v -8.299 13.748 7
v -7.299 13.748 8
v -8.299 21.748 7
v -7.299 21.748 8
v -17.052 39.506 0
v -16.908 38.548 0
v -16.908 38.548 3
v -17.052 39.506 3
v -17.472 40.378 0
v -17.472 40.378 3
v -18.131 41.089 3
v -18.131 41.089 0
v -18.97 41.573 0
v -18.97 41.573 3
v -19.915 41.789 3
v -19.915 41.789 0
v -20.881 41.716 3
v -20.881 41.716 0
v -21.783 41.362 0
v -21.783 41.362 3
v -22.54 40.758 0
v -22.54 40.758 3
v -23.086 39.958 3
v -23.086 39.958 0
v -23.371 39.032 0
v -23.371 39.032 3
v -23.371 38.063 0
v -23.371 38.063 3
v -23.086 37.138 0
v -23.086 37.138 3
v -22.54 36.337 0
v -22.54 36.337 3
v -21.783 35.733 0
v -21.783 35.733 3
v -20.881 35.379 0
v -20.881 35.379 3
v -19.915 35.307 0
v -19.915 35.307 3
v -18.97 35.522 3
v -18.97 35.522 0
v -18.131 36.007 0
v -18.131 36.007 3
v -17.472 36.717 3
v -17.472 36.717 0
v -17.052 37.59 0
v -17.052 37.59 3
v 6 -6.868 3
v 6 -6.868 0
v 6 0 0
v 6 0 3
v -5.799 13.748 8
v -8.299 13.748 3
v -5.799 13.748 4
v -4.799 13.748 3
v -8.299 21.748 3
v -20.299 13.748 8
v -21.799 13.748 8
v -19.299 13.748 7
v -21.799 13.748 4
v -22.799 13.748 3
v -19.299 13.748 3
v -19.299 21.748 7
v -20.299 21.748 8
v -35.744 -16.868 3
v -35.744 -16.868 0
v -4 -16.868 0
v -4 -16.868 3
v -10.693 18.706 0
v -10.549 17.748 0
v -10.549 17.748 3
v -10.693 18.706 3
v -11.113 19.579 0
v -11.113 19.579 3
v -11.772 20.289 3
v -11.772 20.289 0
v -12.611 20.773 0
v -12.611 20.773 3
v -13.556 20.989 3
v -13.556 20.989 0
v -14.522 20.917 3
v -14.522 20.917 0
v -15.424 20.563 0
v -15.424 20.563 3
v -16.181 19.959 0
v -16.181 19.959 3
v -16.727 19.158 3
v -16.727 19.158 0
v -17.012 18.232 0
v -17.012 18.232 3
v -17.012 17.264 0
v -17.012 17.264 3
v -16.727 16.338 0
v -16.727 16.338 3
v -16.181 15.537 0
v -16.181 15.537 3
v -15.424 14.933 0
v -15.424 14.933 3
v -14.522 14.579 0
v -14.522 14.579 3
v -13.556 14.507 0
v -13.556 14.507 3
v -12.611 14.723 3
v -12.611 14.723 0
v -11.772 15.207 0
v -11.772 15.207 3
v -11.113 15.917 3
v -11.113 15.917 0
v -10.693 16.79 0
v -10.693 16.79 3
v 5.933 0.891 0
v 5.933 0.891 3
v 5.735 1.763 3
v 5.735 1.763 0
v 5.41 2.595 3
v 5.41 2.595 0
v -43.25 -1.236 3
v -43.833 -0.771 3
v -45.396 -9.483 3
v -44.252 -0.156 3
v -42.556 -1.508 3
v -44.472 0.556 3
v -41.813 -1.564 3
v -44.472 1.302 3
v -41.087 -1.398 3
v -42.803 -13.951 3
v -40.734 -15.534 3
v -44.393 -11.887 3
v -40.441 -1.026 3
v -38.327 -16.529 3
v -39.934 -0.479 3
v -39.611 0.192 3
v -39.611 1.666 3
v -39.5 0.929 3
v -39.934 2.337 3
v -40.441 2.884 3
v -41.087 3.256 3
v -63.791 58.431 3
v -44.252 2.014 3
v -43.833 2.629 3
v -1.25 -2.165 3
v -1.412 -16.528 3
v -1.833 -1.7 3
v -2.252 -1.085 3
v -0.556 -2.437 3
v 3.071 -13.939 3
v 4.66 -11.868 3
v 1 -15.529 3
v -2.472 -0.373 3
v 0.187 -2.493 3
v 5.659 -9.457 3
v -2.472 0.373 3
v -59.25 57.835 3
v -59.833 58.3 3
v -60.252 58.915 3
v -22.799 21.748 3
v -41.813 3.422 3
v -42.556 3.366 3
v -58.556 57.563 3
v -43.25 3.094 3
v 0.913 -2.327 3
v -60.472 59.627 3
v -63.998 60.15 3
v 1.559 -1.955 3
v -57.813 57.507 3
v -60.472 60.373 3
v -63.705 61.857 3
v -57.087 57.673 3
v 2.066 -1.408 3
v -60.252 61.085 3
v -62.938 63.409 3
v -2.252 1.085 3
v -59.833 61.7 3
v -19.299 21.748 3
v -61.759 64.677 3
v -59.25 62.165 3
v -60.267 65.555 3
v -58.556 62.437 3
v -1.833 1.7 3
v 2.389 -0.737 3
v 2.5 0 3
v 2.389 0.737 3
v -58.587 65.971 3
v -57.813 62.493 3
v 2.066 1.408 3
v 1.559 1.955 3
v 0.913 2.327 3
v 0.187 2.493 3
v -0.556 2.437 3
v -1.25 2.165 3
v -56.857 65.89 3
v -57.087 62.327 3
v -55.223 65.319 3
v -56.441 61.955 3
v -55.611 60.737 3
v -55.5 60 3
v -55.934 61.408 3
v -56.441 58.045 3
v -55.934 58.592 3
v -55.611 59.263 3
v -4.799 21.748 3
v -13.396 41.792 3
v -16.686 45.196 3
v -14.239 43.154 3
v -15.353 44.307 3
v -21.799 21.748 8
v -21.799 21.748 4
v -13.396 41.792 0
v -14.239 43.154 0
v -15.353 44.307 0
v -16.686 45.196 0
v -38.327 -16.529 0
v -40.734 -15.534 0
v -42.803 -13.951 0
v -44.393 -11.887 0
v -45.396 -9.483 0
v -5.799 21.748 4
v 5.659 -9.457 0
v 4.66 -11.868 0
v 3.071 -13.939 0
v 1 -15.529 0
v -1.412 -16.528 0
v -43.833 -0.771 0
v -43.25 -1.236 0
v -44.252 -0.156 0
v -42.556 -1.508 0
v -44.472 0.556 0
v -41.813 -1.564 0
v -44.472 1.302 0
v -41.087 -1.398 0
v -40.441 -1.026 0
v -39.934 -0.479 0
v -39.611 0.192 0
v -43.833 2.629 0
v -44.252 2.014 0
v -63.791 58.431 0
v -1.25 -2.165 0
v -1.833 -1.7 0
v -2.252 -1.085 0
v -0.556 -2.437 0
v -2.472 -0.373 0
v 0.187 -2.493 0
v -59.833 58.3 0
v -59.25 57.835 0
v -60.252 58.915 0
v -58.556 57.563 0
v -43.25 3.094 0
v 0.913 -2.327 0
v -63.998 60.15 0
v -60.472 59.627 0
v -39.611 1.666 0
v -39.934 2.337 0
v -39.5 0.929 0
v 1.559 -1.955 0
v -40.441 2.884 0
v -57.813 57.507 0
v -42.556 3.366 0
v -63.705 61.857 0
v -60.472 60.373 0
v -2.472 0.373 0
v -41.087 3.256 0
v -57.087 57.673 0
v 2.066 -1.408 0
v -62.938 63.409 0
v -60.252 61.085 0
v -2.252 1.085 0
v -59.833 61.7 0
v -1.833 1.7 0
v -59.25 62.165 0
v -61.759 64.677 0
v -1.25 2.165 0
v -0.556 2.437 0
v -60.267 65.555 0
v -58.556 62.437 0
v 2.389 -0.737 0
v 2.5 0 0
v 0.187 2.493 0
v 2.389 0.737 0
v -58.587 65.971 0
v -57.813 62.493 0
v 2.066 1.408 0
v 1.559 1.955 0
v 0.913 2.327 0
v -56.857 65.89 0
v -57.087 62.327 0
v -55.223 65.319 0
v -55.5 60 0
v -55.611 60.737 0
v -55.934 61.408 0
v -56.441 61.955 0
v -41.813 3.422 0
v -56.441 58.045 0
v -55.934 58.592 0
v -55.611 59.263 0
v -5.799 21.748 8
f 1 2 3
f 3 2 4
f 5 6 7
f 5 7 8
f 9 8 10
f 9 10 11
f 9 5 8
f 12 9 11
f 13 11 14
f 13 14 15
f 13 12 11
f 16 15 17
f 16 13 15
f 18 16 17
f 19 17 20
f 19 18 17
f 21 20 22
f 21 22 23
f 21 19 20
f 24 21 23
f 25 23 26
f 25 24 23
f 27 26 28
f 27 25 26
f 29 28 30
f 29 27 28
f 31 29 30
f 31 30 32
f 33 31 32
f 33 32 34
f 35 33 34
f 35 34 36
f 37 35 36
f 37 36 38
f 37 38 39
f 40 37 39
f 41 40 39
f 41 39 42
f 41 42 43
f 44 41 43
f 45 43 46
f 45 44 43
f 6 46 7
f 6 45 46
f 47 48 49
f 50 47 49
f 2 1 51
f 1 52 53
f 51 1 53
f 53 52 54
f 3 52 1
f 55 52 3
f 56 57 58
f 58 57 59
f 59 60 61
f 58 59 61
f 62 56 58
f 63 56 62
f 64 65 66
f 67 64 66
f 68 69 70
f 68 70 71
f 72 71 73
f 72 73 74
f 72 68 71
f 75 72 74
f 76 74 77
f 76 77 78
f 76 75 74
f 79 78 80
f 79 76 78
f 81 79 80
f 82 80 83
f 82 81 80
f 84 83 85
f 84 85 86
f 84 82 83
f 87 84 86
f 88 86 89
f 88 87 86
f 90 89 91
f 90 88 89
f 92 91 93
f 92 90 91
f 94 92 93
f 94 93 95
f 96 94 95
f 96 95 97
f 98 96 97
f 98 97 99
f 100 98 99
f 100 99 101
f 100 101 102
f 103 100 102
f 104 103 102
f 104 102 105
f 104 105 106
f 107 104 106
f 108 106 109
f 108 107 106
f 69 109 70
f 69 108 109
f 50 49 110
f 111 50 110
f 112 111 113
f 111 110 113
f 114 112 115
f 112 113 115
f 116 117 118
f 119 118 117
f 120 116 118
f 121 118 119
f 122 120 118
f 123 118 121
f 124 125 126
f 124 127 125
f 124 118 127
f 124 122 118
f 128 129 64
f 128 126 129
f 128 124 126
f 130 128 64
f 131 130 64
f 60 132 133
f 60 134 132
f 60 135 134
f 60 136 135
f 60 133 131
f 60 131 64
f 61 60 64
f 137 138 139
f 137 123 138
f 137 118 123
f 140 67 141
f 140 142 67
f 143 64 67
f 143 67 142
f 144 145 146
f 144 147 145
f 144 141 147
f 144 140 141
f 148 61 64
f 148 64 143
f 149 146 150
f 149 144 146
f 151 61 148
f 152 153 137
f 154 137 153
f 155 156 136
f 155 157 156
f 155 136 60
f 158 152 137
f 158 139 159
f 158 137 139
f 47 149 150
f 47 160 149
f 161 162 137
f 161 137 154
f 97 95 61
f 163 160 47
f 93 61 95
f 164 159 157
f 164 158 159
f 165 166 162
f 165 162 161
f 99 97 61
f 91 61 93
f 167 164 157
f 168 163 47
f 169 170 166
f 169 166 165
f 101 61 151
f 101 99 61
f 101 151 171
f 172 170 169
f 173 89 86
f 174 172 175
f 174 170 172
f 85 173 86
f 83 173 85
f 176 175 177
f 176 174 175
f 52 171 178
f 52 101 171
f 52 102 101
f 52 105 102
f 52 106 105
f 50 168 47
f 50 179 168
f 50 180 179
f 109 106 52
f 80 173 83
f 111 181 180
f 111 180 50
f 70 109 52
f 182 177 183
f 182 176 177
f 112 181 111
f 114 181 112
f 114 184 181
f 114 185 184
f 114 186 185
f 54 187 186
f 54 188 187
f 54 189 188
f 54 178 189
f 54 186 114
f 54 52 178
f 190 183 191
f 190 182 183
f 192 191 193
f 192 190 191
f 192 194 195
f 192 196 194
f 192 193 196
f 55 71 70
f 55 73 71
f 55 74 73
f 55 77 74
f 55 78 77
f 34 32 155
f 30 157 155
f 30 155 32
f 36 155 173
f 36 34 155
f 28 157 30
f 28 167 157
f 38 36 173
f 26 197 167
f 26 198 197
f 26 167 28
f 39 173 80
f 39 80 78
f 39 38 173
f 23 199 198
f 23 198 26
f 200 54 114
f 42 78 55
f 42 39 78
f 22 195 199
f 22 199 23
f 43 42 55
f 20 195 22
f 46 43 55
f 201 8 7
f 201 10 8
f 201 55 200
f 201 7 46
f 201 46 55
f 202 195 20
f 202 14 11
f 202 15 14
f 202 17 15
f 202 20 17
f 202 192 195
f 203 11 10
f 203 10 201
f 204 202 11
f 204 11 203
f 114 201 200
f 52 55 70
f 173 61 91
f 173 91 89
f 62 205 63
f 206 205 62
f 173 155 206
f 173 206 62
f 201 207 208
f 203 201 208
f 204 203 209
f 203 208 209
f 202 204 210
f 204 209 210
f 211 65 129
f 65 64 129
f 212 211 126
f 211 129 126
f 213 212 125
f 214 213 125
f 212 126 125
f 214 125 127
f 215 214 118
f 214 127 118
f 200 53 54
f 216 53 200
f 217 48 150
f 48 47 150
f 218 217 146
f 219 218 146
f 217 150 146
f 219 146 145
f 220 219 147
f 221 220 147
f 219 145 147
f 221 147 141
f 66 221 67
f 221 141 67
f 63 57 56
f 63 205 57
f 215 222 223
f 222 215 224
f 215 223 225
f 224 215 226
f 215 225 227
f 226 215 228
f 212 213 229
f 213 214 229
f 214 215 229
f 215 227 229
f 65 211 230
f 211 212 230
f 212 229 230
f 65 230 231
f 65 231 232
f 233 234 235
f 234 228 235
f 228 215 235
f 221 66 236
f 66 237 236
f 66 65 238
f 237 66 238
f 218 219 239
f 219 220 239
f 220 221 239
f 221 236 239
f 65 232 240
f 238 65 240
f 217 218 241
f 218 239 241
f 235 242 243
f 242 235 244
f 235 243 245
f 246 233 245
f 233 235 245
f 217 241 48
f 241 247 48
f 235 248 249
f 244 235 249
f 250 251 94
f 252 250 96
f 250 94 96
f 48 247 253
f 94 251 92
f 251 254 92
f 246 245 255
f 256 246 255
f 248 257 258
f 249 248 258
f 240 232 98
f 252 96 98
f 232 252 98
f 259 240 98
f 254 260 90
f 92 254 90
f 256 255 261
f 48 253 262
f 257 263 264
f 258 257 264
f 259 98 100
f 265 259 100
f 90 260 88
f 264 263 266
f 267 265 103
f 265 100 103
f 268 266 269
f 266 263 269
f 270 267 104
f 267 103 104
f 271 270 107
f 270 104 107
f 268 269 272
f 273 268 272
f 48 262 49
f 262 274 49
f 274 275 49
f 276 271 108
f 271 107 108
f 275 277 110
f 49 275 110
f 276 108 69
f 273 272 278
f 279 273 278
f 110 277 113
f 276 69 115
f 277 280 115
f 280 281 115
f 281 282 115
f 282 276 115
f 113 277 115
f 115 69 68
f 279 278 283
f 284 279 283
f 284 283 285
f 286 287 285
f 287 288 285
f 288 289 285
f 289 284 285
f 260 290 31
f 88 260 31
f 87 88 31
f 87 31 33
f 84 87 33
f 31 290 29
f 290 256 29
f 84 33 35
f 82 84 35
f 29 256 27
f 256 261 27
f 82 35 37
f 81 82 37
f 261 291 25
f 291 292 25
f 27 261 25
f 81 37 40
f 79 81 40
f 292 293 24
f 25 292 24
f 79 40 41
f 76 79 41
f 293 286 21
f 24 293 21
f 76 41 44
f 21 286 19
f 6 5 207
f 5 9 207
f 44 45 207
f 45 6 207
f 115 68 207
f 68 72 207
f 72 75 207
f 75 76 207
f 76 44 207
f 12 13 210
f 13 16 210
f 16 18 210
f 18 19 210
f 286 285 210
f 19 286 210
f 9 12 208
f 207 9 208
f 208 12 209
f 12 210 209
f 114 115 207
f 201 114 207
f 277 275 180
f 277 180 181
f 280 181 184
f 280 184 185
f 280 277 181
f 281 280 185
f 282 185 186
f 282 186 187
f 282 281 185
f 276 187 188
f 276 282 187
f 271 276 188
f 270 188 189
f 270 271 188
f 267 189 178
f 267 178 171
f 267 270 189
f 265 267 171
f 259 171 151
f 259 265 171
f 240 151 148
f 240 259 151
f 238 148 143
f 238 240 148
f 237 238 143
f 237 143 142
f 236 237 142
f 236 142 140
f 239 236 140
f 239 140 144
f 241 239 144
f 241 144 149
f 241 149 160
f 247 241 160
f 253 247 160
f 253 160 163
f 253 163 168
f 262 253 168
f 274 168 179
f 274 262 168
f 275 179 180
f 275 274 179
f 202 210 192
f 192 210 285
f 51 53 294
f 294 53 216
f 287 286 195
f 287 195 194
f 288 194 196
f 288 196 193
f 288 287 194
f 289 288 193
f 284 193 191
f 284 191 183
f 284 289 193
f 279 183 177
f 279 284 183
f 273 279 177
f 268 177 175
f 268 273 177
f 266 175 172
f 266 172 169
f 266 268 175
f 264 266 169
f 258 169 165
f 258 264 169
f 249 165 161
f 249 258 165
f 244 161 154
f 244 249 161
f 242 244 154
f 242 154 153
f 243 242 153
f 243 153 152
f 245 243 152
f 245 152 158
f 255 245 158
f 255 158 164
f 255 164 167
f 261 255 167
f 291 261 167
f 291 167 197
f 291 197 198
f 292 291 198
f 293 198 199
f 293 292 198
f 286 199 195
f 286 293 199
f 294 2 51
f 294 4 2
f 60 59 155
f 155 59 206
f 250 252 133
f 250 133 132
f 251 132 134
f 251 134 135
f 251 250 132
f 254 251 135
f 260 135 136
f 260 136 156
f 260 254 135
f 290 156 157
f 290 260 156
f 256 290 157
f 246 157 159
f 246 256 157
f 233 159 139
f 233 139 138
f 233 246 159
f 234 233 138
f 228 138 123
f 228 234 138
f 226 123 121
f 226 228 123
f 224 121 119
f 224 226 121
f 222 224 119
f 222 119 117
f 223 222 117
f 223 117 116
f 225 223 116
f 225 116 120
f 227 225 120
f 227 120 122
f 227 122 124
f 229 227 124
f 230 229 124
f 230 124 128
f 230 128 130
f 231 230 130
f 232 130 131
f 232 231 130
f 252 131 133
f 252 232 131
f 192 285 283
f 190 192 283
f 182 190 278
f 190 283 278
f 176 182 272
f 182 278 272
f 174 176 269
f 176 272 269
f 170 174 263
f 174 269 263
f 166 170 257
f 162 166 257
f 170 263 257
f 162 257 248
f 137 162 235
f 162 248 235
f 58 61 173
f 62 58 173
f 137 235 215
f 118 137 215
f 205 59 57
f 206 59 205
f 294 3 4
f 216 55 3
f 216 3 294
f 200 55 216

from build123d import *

# Parameters (mm, degrees)
SKETCH1_R           = 2.5
SKETCH1_R_2         = 3.25
BOSS_EXTRUDE1_DEPTH = 3
SKETCH2_W           = 2.5
SKETCH2_H           = 8
BOSS_EXTRUDE2_DEPTH = 5
CHAMFER1_SIZE       = 1
FILLET1_R           = 10


with BuildPart() as part:
    # Sketch1 → Boss-Extrude1 (new body)
    with BuildSketch(Plane.XY):
        with BuildLine():
            Line((-63.791318359, 58.43135993), (-43.395591792, -16.868352188))
            Line((-43.395591792, -16.868352188), (6, -16.868352188))
            Line((6, -16.868352188), (6, 0))
            ThreePointArc((6, 0), (5.850545761, 1.330832182), (5.409628568, 2.595364861))
            Line((5.409628568, 2.595364861), (-13.395576429, 41.791847675))
            ThreePointArc((-13.395576429, 41.791847675), (-14.765199318, 43.760307326), (-16.686113759, 45.195851809))
            Line((-16.686113759, 45.195851809), (-55.222801296, 65.318568168))
            ThreePointArc((-55.222801296, 65.318568168), (-61.758941161, 64.676575814), (-63.791318359, 58.43135993))
        make_face()
        Circle(SKETCH1_R, mode=Mode.SUBTRACT)
        with Locations((-58, 60)):
            Circle(SKETCH1_R, mode=Mode.SUBTRACT)
        with Locations((-42, 0.929027955)):
            Circle(SKETCH1_R, mode=Mode.SUBTRACT)
        with Locations((-20.157612139, 38.547641599)):
            Circle(SKETCH1_R_2, mode=Mode.SUBTRACT)
        with Locations((-13.798527561, 17.748013157)):
            Circle(SKETCH1_R_2, mode=Mode.SUBTRACT)
    extrude(amount=BOSS_EXTRUDE1_DEPTH)

    # Sketch2 → Boss-Extrude2 (add)
    with BuildSketch(Plane.XY.offset(3)):
        with Locations((-7.048527561, 17.748013157)):
            Rectangle(SKETCH2_W, SKETCH2_H)
        with Locations((-20.548527561, 17.748013157)):
            Rectangle(SKETCH2_W, SKETCH2_H)
    extrude(amount=BOSS_EXTRUDE2_DEPTH)

    # Chamfer1
    chamfer1_edges = [part.edges().sort_by_distance(p)[0] for p in [
        (-5.798527561, 17.748013157, 3),
        (-8.298527561, 17.748013157, 8),
        (-21.798527561, 17.748013157, 3),
        (-19.298527561, 17.748013157, 8),
    ]]
    chamfer(chamfer1_edges, length=CHAMFER1_SIZE)

    # Fillet1
    fillet1_edges = [part.edges().sort_by_distance(p)[0] for p in [
        (6, -16.868352188, 1.5),
        (-43.395591792, -16.868352188, 1.5),
    ]]
    fillet(fillet1_edges, radius=FILLET1_R)


solid = part.part
